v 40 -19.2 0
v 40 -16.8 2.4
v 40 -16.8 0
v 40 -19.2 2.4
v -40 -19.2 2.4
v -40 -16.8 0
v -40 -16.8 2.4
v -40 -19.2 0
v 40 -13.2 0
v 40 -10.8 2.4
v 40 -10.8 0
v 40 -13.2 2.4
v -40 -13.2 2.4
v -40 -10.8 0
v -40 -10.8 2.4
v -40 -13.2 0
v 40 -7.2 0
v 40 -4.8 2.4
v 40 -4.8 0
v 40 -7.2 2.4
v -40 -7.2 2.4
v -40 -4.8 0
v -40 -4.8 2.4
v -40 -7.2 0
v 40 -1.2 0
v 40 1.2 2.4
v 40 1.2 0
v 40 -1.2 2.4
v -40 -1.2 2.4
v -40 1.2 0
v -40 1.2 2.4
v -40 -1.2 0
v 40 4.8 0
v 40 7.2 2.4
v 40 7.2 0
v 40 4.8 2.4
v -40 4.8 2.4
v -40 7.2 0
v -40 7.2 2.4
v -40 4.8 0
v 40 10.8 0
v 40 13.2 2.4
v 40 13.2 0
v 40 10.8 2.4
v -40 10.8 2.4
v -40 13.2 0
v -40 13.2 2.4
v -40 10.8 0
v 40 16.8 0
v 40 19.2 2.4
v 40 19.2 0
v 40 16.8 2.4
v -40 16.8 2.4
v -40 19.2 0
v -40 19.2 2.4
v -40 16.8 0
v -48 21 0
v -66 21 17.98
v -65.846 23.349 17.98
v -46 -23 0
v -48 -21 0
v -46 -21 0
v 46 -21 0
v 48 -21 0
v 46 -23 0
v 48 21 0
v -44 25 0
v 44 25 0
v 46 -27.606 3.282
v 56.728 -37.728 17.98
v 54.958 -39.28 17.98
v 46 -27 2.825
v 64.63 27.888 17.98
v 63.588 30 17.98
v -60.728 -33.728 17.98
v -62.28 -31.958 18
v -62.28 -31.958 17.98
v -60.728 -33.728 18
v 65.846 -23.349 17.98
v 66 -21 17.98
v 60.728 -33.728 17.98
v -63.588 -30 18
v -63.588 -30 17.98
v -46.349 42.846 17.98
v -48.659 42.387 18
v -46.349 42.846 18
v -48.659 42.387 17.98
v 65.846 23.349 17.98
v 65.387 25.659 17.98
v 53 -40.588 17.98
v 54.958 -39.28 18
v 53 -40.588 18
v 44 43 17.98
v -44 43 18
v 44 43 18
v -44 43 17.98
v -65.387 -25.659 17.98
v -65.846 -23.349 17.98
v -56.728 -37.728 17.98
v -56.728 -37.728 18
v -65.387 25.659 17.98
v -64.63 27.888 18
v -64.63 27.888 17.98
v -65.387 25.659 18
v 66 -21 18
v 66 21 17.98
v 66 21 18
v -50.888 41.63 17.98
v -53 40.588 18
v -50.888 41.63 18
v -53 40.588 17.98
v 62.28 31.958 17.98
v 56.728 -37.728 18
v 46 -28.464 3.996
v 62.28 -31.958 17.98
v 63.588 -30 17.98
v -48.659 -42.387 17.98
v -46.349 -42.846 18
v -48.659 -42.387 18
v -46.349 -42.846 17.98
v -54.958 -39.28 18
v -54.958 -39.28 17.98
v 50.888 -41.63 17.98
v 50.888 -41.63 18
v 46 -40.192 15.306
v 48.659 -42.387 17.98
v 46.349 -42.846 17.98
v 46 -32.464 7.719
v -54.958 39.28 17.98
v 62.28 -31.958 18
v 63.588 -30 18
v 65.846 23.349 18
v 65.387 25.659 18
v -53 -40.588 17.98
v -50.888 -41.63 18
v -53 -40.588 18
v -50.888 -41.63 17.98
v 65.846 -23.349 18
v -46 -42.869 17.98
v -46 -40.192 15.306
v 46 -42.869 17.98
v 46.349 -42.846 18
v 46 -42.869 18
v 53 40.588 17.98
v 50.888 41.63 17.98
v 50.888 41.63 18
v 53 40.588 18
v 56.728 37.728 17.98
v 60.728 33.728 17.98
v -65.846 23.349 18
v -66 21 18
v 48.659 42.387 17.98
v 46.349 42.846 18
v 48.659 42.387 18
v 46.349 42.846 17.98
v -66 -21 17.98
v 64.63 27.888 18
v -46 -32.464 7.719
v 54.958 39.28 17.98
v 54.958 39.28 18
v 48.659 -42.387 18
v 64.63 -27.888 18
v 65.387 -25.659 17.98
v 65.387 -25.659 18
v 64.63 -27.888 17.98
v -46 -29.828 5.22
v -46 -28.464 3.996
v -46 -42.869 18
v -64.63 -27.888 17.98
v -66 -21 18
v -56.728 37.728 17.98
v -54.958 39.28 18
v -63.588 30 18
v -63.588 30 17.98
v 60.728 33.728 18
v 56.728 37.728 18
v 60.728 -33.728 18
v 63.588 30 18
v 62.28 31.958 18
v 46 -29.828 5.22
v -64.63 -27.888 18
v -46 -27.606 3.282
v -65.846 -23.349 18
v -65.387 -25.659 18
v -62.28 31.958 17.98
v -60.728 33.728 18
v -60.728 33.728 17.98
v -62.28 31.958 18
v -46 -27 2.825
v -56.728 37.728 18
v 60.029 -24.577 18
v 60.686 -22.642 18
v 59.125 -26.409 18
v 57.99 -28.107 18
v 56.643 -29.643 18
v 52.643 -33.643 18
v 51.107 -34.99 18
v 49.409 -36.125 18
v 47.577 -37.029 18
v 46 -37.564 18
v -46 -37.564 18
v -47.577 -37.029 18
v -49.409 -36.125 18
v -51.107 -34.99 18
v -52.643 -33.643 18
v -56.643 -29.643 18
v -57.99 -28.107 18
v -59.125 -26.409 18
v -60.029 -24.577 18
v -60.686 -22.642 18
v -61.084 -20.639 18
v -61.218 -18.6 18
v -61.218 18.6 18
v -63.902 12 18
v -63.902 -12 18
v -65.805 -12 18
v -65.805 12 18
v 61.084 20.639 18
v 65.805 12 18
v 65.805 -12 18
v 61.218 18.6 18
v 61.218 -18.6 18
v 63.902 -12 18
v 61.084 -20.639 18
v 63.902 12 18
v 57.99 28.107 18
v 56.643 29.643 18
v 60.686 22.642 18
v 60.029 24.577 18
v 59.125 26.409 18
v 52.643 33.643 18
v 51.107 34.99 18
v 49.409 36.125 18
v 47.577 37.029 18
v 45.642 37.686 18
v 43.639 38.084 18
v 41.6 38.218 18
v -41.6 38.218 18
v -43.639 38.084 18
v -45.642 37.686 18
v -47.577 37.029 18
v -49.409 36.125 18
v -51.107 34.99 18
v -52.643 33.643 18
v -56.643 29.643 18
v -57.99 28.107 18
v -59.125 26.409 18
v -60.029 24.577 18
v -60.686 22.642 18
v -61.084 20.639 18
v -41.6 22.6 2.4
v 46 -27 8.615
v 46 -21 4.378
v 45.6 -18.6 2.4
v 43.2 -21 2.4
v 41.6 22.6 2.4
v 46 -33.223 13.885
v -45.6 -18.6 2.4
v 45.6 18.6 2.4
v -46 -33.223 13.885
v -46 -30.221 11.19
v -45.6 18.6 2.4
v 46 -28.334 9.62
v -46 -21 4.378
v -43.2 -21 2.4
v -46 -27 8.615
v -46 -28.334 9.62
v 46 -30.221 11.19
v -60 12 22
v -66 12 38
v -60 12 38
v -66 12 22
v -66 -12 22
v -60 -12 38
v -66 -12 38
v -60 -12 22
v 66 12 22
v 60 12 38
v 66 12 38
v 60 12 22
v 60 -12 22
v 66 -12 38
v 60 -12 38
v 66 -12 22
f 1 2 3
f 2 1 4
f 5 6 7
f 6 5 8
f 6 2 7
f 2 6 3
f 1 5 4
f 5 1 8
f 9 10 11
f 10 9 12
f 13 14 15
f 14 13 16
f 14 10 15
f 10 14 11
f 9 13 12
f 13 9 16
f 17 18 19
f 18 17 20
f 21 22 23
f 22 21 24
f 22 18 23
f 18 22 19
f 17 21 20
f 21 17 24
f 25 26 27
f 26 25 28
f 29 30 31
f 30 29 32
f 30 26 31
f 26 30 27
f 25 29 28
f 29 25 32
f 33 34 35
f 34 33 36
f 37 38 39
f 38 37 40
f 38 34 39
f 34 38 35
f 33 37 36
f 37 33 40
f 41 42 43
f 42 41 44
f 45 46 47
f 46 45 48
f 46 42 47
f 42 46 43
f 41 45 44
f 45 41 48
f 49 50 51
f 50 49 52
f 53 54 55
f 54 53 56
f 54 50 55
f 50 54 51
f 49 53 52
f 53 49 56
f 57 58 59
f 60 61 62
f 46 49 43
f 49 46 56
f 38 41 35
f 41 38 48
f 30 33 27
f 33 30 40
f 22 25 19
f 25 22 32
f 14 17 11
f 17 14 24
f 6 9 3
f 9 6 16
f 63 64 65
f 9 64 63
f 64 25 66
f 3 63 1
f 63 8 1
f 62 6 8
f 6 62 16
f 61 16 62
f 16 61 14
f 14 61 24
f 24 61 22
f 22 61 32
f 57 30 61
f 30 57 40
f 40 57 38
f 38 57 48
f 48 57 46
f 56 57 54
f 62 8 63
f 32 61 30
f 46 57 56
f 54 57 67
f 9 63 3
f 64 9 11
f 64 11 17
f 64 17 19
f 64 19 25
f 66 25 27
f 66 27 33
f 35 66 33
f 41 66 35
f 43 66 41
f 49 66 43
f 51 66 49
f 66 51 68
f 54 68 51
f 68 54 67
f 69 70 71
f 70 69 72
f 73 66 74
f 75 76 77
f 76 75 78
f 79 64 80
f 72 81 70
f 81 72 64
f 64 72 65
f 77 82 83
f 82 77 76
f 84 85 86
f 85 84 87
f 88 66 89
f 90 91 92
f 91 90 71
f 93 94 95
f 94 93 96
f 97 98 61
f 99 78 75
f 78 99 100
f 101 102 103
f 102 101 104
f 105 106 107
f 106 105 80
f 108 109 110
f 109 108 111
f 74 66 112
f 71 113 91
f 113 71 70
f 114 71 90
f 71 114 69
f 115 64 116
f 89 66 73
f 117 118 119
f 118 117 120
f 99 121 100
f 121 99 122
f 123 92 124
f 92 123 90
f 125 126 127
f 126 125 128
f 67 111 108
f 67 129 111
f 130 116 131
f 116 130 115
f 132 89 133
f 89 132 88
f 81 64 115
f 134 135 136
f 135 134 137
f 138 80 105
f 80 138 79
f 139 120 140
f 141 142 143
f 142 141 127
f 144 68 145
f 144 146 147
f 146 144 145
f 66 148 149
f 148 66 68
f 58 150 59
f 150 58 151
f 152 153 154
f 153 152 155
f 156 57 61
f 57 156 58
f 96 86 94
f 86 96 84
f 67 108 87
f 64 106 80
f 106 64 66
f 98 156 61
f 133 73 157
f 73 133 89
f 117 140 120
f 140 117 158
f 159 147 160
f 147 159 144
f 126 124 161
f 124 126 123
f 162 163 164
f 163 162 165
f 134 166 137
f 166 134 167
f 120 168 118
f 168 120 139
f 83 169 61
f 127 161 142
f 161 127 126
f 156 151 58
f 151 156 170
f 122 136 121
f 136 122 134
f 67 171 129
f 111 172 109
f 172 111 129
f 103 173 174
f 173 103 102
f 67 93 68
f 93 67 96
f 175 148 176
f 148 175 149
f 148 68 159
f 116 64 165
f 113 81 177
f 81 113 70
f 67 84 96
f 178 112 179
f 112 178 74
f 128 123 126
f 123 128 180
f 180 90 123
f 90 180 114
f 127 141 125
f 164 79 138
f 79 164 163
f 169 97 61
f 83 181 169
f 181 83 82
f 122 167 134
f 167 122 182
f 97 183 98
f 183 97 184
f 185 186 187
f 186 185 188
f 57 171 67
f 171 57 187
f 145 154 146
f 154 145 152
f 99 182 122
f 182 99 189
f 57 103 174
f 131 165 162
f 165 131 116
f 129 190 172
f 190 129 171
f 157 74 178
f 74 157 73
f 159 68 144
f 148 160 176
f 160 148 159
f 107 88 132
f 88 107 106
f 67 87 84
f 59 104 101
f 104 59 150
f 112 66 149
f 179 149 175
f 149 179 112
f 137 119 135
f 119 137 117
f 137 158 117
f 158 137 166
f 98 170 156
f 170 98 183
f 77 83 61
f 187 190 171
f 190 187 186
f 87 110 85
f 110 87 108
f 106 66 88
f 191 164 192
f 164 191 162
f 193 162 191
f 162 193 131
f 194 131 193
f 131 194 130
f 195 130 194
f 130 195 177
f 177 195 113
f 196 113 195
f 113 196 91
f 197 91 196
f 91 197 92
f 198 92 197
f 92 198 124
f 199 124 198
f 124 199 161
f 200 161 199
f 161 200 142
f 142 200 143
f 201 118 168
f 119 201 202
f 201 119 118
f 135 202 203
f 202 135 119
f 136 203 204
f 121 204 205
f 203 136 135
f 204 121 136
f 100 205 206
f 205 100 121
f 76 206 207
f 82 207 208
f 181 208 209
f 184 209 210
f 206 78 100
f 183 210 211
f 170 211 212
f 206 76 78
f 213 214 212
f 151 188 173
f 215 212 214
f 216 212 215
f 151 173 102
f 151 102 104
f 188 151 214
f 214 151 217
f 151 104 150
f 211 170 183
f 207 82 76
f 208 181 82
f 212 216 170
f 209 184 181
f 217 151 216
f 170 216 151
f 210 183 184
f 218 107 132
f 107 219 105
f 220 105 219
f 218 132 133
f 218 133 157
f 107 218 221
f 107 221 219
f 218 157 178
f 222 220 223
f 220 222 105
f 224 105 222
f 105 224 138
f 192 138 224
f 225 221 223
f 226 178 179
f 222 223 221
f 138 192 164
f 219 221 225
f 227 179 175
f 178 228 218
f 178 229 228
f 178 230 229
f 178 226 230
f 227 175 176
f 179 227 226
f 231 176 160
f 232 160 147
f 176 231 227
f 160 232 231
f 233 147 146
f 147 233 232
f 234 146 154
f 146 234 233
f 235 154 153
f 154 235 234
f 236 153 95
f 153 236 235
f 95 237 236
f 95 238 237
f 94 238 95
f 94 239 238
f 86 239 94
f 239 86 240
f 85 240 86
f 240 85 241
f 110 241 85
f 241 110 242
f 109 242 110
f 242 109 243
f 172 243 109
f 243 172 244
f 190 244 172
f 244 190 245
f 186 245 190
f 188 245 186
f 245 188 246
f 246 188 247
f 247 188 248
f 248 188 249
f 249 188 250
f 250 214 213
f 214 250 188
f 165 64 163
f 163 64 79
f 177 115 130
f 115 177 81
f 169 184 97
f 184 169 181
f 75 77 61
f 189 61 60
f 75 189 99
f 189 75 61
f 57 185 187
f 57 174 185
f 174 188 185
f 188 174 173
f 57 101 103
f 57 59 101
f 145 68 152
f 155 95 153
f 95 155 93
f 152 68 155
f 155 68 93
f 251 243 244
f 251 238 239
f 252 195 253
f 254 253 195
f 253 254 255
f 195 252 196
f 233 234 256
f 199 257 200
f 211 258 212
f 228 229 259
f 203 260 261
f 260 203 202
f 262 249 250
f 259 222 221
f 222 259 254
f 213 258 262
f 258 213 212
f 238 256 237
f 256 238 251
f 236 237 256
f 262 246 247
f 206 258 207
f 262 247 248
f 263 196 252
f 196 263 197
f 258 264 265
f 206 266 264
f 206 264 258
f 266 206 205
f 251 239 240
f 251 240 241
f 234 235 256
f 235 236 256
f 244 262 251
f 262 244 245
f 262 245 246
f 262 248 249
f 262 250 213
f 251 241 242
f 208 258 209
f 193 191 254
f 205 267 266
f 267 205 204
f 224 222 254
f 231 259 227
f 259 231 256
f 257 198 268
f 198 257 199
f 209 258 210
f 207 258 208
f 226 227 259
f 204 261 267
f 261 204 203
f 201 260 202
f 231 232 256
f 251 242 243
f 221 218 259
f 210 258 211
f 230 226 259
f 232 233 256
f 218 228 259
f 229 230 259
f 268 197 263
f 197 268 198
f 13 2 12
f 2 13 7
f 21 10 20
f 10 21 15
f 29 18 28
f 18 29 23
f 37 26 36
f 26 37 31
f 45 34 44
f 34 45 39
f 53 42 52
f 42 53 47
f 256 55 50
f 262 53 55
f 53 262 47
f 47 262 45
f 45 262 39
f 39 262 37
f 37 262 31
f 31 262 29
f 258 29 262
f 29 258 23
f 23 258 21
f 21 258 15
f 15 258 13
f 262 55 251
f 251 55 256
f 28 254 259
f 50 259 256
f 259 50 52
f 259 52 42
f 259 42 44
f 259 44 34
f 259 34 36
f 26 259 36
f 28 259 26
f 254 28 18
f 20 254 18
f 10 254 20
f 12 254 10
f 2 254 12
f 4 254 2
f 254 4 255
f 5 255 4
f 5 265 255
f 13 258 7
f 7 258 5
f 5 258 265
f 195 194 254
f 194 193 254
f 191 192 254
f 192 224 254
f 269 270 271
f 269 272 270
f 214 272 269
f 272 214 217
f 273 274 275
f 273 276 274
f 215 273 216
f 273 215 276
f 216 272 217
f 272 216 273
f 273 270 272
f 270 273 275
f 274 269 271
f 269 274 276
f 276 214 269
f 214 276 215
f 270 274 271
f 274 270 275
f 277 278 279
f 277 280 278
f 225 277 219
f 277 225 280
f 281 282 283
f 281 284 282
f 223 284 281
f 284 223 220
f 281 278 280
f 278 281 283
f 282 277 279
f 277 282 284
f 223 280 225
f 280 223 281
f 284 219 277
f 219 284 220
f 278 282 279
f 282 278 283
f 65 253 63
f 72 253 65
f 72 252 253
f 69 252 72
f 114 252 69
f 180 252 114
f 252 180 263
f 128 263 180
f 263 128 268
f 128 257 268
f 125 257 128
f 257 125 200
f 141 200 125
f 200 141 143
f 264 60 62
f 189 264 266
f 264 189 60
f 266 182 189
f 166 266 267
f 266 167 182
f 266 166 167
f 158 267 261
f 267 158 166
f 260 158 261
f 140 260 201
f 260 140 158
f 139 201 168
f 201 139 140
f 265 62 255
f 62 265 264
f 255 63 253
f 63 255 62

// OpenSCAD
// R3.3: nested basket, heavier gravity ring, raised retainer grip, mm. Not physically tested.
// Upright print orientation. The basket front is OPEN for watering cloth.
// Direct robot pickup from the printer plate is assumed; no plate hardware.
part="basket";
$fn=48; eps=.02;
basket_z=27; cloth_t=2; grow_pad_t=3;
retainer_z=basket_z+2.4+cloth_t+grow_pad_t; // 34.4 mm
module rect2(w,d,c=4){polygon([[-w/2+c,-d/2],[w/2-c,-d/2],[w/2,-d/2+c],[w/2,d/2-c],[w/2-c,d/2],[-w/2+c,d/2],[-w/2,d/2-c],[-w/2,-d/2+c]]);}
module slab(w,d,h,c=4){linear_extrude(h)rect2(w,d,c);}
module taper(w0,d0,w1,d1,h){hull(){slab(w0,d0,eps);translate([0,0,h-eps])linear_extrude(eps)offset(r=(w1-w0)/2)rect2(w0,d0);}}
module reservoir(){
 union(){
  difference(){slab(140,94,45);translate([0,0,2])slab(134,88,45,3);}
  for(s=[-1,1])translate([s*72.9-3.1,-12,0])cube([6.2,24,16]);
  // Permanent integral basket rests. These are NOT removable print supports.
  for(x=[-35,0,35])translate([x-2,-16,1.9])cube([4,32,basket_z-1.9]);
 }
}
module basket_body(){
 union(){
  difference(){
   taper(96,50,132,86,18);
   translate([0,0,2.4])taper(91.2,45.2,126.4,80.4,17.6);
   for(y=[-18,-12,-6,0,6,12,18])translate([-40,y-1.2,-.1])cube([80,2.4,2.6]);
  }
  for(s=[-1,1])scale([s,1,1]){
   hull(){translate([64,-12,17.9])cube([1.8,24,.1]);translate([60,-12,22])cube([6,24,.1]);}
   translate([60,-12,22])cube([6,24,16]);
  }
 }
}
module basket(){difference(){
 basket_body();
 // 92 mm clear width for 88 mm cloth, 2 mm clearance on each side.
 // Open to the top; cut reaches the edge of the mat platform at Y=-21.
 translate([-46,-60,-.1])cube([92,39,60]);
}}
module retainer_base(){polygon([[-41.6,-22.6],[41.6,-22.6],[45.6,-18.6],[45.6,18.6],[41.6,22.6],[-41.6,22.6],[-45.6,18.6],[-45.6,-18.6]]);}
module retainer_profile(r){offset(r=r)retainer_base();}
module retainer_taper(r0,r1,h){hull(){linear_extrude(eps)retainer_profile(r0);translate([0,0,h-eps])linear_extrude(eps)retainer_profile(r1);}}
module retainer(){union(){
 difference(){retainer_taper(4.7,13.7,9);translate([0,0,-.1])retainer_taper(.6,9.8,9.2);}
 for(s=[-1,1])scale([s,1,1])translate([42,-4,0])cube([8.2,8,.8]);
 for(s=[-1,1])scale([1,s,1])translate([-4,19,0])cube([8,8.2,.8]);
 // Dedicated rear grip. Outside the grow pad (Y <= 21), integral to the rim.
 // 45-degree outward flare avoids a suspended overhang during upright printing.
 hull(){translate([-8,25.8,0])cube([16,1.5,.02]);translate([-8,25.8,4.5])cube([16,6,.02]);}
 translate([-8,25.8,4.5])cube([16,6,29.5]);
 // Pinch the top 10 mm across Y. At the 34.4 mm seat, jaw tips stay at
 // Z >= 58.4, above the 45 mm rear rim. Fully seat, then open and lift away.
}}
module assembly(){reservoir();translate([0,0,basket_z])basket();translate([0,0,retainer_z])retainer();}
module plate(){translate([110,161,0])reservoir();translate([110,48,0])retainer();}
if(part=="reservoir")reservoir();
if(part=="basket")basket();
if(part=="retainer")retainer();
if(part=="assembly")assembly();
if(part=="plate")plate();
